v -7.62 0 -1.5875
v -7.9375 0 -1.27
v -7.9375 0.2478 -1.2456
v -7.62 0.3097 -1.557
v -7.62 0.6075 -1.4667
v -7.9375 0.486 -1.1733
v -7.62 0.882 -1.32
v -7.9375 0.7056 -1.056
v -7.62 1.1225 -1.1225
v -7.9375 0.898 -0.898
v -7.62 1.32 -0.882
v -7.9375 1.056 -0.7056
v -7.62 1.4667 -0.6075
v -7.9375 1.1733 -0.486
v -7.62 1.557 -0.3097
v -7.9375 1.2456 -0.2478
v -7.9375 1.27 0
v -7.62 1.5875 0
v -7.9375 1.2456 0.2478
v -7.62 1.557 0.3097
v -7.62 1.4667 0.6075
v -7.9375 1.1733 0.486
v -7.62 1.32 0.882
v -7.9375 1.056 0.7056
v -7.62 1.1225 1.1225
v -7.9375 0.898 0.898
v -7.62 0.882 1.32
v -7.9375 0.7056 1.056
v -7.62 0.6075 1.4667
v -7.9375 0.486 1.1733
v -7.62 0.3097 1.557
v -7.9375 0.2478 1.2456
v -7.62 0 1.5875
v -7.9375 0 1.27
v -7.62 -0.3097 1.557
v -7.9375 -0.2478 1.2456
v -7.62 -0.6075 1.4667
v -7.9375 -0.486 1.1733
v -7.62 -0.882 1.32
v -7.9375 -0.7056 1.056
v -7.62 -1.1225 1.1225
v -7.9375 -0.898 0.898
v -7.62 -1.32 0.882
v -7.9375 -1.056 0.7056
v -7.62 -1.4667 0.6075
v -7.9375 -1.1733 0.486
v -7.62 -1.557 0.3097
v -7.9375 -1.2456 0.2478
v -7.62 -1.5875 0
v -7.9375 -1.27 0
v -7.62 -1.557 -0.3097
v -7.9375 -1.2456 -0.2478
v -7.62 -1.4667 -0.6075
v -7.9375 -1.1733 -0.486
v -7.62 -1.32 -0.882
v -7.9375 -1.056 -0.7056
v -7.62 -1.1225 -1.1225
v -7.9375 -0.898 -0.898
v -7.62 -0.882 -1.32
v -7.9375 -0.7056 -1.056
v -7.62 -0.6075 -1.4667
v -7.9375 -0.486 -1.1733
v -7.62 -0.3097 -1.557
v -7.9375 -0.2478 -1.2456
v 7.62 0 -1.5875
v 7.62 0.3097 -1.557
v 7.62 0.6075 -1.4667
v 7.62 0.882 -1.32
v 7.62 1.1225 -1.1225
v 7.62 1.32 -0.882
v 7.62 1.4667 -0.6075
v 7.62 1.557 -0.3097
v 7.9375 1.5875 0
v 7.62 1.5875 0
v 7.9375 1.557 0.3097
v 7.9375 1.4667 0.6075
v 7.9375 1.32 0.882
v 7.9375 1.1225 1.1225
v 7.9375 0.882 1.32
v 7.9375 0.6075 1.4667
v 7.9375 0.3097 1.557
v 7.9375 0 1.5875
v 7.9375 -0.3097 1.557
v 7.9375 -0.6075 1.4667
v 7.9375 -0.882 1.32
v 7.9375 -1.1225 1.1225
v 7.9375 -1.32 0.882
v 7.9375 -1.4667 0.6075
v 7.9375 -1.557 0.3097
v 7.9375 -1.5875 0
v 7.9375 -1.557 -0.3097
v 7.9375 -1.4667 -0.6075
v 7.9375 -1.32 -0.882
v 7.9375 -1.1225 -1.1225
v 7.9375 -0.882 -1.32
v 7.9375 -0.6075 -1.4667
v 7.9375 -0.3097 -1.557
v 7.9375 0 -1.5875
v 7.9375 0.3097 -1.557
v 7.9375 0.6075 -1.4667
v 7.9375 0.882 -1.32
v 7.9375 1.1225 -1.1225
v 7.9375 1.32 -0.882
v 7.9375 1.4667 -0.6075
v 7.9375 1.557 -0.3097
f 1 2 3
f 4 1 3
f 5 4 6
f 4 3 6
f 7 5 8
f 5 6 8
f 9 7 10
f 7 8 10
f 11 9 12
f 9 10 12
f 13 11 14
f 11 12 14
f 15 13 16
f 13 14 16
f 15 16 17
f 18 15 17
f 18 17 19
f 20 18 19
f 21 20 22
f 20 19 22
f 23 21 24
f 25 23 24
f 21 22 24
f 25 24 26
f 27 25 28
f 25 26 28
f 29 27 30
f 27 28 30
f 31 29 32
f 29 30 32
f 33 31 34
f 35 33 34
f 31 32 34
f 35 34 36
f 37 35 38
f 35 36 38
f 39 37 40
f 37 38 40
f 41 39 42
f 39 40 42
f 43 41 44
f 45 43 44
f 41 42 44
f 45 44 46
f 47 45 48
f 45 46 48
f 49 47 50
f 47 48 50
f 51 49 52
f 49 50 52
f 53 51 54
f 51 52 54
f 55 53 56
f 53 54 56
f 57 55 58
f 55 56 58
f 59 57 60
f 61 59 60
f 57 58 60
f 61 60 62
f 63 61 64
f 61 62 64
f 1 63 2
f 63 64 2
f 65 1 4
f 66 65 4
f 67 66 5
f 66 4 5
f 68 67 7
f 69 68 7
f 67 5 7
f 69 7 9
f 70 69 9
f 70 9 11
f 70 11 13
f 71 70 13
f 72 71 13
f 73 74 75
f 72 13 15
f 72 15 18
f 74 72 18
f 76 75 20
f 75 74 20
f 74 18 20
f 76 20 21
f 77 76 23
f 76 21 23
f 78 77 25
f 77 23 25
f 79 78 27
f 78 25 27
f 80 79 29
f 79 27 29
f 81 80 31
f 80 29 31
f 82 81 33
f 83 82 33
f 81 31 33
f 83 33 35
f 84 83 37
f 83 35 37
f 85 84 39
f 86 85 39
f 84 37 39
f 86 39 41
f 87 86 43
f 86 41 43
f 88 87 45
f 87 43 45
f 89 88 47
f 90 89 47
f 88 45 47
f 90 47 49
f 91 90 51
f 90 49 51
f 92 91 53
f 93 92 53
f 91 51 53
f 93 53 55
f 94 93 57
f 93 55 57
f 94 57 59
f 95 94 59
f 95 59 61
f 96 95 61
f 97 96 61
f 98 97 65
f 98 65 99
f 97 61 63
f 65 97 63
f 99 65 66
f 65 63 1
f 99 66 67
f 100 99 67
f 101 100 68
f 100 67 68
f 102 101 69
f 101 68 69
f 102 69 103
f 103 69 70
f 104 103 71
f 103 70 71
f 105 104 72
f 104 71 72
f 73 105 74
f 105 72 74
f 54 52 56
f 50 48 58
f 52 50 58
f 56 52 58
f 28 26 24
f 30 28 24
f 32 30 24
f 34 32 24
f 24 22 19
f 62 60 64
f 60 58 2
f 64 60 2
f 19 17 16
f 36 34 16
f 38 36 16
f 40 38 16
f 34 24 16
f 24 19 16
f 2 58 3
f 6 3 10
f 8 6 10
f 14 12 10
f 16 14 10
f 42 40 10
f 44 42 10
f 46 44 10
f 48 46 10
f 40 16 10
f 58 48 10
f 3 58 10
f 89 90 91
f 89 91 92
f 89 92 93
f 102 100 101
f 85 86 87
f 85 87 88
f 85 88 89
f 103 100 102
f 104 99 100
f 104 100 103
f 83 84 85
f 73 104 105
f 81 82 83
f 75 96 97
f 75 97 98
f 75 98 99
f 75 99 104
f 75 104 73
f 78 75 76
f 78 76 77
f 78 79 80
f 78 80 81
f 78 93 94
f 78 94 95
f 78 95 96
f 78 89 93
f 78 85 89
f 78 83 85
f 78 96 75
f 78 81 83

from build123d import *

# Parameters (mm, degrees)
EXTRUDE1_DEPTH        = 7.9375
EXTRUDE1_DEPTH_BACK   = 7.9375
SKETCH2_R             = 1.5875
CHAMFER1_SIZE         = 0.3175
DELETEFACE1_START     = 7.6199999
DELETEFACE1_OUTLINE_R = 1.5875
DELETEFACE1_DEPTH     = 0.3175001


# Read off the part's stored shape, not the designer's step: DeleteFace1
with BuildPart() as part:
    # Sketch2 → Extrude1 (new, two sides: drawn at the far end of the back side and taken through both)
    with BuildSketch(Plane(origin=(0, 0, 0), x_dir=(0, 0, -1), z_dir=(1, 0, 0)).offset(-EXTRUDE1_DEPTH_BACK)):
        Circle(SKETCH2_R)
    extrude(amount=EXTRUDE1_DEPTH + EXTRUDE1_DEPTH_BACK)

    # Chamfer1
    chamfer1_edges = [part.edges().sort_by_distance(p)[0] for p in [
        (-7.9375, 0, 1.5875),
        (7.9375, 0, 1.5875),
    ]]
    chamfer(chamfer1_edges, length=CHAMFER1_SIZE)

    # DeleteFace1 outline → DeleteFace1 (add)
    with BuildSketch(Plane.YZ.offset(DELETEFACE1_START)):
        Circle(DELETEFACE1_OUTLINE_R)
    extrude(amount=DELETEFACE1_DEPTH)


solid = part.part
